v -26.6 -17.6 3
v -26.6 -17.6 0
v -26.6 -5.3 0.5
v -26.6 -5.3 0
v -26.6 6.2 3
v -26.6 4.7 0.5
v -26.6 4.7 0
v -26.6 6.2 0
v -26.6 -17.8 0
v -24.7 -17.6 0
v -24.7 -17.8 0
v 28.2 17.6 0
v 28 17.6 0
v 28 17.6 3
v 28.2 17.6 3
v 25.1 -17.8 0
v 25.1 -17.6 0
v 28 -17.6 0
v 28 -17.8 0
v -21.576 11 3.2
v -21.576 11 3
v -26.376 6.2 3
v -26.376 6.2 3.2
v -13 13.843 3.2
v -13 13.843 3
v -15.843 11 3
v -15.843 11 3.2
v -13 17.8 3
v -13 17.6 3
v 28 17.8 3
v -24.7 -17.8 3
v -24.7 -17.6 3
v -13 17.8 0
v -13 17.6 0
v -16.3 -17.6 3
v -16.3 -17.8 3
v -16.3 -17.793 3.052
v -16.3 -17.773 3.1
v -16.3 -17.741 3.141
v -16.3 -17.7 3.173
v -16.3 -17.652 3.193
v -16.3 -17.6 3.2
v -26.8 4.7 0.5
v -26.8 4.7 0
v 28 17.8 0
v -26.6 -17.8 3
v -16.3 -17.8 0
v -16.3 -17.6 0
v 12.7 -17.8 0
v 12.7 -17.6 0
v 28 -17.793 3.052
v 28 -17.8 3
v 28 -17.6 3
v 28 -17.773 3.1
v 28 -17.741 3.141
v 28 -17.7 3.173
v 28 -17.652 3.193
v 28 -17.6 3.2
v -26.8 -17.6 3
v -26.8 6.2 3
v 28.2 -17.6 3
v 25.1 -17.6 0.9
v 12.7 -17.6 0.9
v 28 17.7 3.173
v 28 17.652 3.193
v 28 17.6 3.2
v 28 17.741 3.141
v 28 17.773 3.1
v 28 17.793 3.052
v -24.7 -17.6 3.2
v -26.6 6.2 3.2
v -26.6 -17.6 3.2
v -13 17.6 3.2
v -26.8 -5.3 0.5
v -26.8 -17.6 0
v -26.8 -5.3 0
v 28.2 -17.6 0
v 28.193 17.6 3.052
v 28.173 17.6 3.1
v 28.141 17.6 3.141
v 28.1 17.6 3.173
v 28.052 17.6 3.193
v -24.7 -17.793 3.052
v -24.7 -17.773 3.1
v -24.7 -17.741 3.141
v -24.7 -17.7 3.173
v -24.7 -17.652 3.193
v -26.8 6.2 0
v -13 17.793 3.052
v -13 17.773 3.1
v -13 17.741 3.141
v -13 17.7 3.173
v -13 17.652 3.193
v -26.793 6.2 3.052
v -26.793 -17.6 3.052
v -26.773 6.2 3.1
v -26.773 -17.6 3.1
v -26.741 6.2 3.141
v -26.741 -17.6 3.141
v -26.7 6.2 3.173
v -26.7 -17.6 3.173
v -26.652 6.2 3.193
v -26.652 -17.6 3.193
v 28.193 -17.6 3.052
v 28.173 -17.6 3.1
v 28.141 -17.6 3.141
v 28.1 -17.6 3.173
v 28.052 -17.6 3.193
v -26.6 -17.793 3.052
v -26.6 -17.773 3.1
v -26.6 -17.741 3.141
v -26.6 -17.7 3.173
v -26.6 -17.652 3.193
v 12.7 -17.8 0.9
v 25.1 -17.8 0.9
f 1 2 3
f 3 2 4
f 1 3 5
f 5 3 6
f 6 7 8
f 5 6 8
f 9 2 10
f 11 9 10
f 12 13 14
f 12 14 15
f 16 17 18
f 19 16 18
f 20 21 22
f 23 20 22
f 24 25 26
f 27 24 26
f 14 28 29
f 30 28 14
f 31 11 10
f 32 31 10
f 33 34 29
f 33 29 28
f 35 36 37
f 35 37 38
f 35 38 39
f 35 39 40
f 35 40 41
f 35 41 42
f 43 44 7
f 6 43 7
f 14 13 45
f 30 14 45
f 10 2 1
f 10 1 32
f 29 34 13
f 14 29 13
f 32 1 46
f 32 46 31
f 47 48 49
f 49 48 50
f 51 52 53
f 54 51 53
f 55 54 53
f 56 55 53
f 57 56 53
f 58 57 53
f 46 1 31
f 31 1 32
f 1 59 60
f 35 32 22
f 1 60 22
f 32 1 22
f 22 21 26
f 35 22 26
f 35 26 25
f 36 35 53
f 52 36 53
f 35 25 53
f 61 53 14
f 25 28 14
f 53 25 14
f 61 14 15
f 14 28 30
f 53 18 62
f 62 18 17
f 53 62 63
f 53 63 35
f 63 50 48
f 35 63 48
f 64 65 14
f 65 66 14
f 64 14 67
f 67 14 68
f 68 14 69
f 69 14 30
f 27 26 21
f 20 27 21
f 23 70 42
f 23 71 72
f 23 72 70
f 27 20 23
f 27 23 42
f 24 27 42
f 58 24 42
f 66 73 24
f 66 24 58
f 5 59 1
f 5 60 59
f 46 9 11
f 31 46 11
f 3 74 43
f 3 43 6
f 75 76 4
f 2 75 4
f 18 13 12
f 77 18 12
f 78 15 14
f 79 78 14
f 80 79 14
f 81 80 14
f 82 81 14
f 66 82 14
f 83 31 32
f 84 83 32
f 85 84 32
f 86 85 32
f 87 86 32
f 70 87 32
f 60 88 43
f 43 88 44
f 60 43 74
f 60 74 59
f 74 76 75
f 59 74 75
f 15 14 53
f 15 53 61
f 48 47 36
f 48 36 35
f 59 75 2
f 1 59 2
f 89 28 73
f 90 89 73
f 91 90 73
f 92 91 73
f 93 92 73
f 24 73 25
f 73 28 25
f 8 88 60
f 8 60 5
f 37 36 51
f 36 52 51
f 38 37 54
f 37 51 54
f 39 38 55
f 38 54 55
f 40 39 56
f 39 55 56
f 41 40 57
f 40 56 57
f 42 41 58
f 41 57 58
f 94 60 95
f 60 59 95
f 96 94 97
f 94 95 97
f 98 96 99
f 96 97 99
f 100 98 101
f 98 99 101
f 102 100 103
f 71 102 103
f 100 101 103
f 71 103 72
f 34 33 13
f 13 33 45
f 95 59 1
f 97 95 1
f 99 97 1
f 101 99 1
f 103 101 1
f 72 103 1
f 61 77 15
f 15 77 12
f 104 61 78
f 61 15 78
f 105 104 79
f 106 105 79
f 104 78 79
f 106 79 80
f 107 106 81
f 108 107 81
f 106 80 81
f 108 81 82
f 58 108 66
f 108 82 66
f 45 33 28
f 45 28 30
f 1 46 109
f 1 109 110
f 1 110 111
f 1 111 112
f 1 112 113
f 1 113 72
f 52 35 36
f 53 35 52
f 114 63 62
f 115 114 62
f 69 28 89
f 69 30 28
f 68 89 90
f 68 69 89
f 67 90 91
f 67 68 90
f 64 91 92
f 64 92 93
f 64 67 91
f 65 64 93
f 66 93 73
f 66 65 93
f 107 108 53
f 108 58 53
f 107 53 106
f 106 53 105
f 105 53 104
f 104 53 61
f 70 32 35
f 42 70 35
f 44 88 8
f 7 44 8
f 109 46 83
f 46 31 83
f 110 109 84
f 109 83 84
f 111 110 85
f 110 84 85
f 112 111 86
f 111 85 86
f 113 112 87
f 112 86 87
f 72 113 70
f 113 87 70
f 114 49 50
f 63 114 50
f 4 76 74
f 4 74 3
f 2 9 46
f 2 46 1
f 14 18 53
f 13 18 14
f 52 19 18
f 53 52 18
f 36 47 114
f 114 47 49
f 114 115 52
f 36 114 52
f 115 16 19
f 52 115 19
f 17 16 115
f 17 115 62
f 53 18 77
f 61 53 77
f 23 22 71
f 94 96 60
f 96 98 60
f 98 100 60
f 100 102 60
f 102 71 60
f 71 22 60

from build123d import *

# Parameters (mm, degrees)
F0_W     = 0.2
F0_H     = 12.3
F0_H_2   = 10
F0_H_3   = 1.5
F1_DEPTH = 3
F0_W_2   = 1.9
F0_H_4   = 0.2
F0_W_3   = 29
F0_W_4   = 2.900001
F0_W_5   = 12.399999
F0_W_6   = 40.999958
F0_H_5   = 35.199967
F2_START = 3
F2_DEPTH = 0.2
F3_DEPTH = 0.9
F4_DEPTH = 0.5
F5_R     = 0.1999


# Not quite as in the source:
# - a fillet or chamfer is up to 0.001 mm smaller than in the source, because OpenCascade refuses the exact size


with BuildPart() as f1:
    # F0 (on Top) → F1 (new body)
    with BuildSketch(Plane.XY):
        with Locations((-26.70002, -11.450007)):
            Rectangle(F0_W, F0_H)
        with Locations((-26.70002, -0.300007)):
            Rectangle(F0_W, F0_H_2)
        with Locations((-26.70002, 5.449993)):
            Rectangle(F0_W, F0_H_3)
    extrude(amount=F1_DEPTH)

    # F0 (on Top) → F4 (cut)
    with BuildSketch(Plane.XY):
        with Locations((-26.70002, -0.300007)):
            Rectangle(F0_W, F0_H_2)
    extrude(amount=F4_DEPTH, mode=Mode.SUBTRACT)


with BuildPart() as f1b:
    # F0 (on Top) → F1, piece 2 (new body)
    with BuildSketch(Plane.XY):
        with Locations((-25.65002, -17.700007)):
            Rectangle(F0_W_2, F0_H_4)
    extrude(amount=F1_DEPTH)


with BuildPart() as f1c:
    # F0 (on Top) → F1, piece 3 (new body)
    with BuildSketch(Plane.XY):
        with Locations((-1.80002, -17.700007)):
            Rectangle(F0_W_3, F0_H_4)
        with Locations((26.5499795, -17.700007)):
            Rectangle(F0_W_4, F0_H_4)
        with Locations((18.8999795, -17.700007)):
            Rectangle(F0_W_5, F0_H_4)
    extrude(amount=F1_DEPTH)

    # F0 (on Top) → F3 (cut)
    with BuildSketch(Plane.XY):
        with Locations((18.8999795, -17.700007)):
            Rectangle(F0_W_5, F0_H_4)
    extrude(amount=F3_DEPTH, mode=Mode.SUBTRACT)


with BuildPart() as f1d:
    # F0 (on Top) → F1, piece 4 (new body)
    with BuildSketch(Plane.XY):
        with Locations((7.500001, 17.69996)):
            Rectangle(F0_W_6, F0_H_4)
    extrude(amount=F1_DEPTH)


with BuildPart() as f1e:
    # F0 (on Top) → F1, piece 5 (new body)
    with BuildSketch(Plane.XY):
        with Locations((28.09998, -2.35e-05)):
            Rectangle(F0_W, F0_H_5)
    extrude(amount=F1_DEPTH)


with BuildPart() as f2:
    # F0 (on Top) → F2 (new body)
    with BuildSketch(Plane.XY.offset(F2_START)):
        with Locations((-26.70002, -11.450007)):
            Rectangle(F0_W, F0_H)
        Polygon((-26.60002, -5.300007), (-26.60002, -17.600007), (-24.70002, -17.600007), (-16.30002, -17.600007), (12.69998, -17.600007), (25.099979, -17.600007), (27.99998, -17.600007), (27.99998, 17.59996), (-12.999978, 17.59996), (-12.999978, 13.84288), (-15.84286, 10.999998), (-21.575756, 10.999998), (-26.375761, 6.199993), (-26.60002, 6.199993), (-26.60002, 4.699993), align=None)
        with Locations((-25.65002, -17.700007)):
            Rectangle(F0_W_2, F0_H_4)
        with Locations((-1.80002, -17.700007)):
            Rectangle(F0_W_3, F0_H_4)
        with Locations((18.8999795, -17.700007)):
            Rectangle(F0_W_5, F0_H_4)
        with Locations((26.5499795, -17.700007)):
            Rectangle(F0_W_4, F0_H_4)
        with Locations((28.09998, -2.35e-05)):
            Rectangle(F0_W, F0_H_5)
        with Locations((7.500001, 17.69996)):
            Rectangle(F0_W_6, F0_H_4)
        with Locations((-26.70002, 5.449993)):
            Rectangle(F0_W, F0_H_3)
        with Locations((-26.70002, -0.300007)):
            Rectangle(F0_W, F0_H_2)
    extrude(amount=F2_DEPTH)

    # F5 (radius 0.2 in the source; OpenCascade refuses exactly that, so slightly less here)
    f5_edges = [f2.edges().sort_by_distance(p)[0] for p in [
        (5.84998, -17.800007, 3.2),
        (-26.80002, -5.700007, 3.2),
        (7.500001, 17.79996, 3.2),
        (28.19998, -2.4e-05, 3.2),
        (-25.65002, -17.800007, 3.2),
    ]]
    fillet(f5_edges, radius=F5_R)


solid = Compound([f1.part, f1b.part, f1c.part, f1d.part, f1e.part, f2.part])
